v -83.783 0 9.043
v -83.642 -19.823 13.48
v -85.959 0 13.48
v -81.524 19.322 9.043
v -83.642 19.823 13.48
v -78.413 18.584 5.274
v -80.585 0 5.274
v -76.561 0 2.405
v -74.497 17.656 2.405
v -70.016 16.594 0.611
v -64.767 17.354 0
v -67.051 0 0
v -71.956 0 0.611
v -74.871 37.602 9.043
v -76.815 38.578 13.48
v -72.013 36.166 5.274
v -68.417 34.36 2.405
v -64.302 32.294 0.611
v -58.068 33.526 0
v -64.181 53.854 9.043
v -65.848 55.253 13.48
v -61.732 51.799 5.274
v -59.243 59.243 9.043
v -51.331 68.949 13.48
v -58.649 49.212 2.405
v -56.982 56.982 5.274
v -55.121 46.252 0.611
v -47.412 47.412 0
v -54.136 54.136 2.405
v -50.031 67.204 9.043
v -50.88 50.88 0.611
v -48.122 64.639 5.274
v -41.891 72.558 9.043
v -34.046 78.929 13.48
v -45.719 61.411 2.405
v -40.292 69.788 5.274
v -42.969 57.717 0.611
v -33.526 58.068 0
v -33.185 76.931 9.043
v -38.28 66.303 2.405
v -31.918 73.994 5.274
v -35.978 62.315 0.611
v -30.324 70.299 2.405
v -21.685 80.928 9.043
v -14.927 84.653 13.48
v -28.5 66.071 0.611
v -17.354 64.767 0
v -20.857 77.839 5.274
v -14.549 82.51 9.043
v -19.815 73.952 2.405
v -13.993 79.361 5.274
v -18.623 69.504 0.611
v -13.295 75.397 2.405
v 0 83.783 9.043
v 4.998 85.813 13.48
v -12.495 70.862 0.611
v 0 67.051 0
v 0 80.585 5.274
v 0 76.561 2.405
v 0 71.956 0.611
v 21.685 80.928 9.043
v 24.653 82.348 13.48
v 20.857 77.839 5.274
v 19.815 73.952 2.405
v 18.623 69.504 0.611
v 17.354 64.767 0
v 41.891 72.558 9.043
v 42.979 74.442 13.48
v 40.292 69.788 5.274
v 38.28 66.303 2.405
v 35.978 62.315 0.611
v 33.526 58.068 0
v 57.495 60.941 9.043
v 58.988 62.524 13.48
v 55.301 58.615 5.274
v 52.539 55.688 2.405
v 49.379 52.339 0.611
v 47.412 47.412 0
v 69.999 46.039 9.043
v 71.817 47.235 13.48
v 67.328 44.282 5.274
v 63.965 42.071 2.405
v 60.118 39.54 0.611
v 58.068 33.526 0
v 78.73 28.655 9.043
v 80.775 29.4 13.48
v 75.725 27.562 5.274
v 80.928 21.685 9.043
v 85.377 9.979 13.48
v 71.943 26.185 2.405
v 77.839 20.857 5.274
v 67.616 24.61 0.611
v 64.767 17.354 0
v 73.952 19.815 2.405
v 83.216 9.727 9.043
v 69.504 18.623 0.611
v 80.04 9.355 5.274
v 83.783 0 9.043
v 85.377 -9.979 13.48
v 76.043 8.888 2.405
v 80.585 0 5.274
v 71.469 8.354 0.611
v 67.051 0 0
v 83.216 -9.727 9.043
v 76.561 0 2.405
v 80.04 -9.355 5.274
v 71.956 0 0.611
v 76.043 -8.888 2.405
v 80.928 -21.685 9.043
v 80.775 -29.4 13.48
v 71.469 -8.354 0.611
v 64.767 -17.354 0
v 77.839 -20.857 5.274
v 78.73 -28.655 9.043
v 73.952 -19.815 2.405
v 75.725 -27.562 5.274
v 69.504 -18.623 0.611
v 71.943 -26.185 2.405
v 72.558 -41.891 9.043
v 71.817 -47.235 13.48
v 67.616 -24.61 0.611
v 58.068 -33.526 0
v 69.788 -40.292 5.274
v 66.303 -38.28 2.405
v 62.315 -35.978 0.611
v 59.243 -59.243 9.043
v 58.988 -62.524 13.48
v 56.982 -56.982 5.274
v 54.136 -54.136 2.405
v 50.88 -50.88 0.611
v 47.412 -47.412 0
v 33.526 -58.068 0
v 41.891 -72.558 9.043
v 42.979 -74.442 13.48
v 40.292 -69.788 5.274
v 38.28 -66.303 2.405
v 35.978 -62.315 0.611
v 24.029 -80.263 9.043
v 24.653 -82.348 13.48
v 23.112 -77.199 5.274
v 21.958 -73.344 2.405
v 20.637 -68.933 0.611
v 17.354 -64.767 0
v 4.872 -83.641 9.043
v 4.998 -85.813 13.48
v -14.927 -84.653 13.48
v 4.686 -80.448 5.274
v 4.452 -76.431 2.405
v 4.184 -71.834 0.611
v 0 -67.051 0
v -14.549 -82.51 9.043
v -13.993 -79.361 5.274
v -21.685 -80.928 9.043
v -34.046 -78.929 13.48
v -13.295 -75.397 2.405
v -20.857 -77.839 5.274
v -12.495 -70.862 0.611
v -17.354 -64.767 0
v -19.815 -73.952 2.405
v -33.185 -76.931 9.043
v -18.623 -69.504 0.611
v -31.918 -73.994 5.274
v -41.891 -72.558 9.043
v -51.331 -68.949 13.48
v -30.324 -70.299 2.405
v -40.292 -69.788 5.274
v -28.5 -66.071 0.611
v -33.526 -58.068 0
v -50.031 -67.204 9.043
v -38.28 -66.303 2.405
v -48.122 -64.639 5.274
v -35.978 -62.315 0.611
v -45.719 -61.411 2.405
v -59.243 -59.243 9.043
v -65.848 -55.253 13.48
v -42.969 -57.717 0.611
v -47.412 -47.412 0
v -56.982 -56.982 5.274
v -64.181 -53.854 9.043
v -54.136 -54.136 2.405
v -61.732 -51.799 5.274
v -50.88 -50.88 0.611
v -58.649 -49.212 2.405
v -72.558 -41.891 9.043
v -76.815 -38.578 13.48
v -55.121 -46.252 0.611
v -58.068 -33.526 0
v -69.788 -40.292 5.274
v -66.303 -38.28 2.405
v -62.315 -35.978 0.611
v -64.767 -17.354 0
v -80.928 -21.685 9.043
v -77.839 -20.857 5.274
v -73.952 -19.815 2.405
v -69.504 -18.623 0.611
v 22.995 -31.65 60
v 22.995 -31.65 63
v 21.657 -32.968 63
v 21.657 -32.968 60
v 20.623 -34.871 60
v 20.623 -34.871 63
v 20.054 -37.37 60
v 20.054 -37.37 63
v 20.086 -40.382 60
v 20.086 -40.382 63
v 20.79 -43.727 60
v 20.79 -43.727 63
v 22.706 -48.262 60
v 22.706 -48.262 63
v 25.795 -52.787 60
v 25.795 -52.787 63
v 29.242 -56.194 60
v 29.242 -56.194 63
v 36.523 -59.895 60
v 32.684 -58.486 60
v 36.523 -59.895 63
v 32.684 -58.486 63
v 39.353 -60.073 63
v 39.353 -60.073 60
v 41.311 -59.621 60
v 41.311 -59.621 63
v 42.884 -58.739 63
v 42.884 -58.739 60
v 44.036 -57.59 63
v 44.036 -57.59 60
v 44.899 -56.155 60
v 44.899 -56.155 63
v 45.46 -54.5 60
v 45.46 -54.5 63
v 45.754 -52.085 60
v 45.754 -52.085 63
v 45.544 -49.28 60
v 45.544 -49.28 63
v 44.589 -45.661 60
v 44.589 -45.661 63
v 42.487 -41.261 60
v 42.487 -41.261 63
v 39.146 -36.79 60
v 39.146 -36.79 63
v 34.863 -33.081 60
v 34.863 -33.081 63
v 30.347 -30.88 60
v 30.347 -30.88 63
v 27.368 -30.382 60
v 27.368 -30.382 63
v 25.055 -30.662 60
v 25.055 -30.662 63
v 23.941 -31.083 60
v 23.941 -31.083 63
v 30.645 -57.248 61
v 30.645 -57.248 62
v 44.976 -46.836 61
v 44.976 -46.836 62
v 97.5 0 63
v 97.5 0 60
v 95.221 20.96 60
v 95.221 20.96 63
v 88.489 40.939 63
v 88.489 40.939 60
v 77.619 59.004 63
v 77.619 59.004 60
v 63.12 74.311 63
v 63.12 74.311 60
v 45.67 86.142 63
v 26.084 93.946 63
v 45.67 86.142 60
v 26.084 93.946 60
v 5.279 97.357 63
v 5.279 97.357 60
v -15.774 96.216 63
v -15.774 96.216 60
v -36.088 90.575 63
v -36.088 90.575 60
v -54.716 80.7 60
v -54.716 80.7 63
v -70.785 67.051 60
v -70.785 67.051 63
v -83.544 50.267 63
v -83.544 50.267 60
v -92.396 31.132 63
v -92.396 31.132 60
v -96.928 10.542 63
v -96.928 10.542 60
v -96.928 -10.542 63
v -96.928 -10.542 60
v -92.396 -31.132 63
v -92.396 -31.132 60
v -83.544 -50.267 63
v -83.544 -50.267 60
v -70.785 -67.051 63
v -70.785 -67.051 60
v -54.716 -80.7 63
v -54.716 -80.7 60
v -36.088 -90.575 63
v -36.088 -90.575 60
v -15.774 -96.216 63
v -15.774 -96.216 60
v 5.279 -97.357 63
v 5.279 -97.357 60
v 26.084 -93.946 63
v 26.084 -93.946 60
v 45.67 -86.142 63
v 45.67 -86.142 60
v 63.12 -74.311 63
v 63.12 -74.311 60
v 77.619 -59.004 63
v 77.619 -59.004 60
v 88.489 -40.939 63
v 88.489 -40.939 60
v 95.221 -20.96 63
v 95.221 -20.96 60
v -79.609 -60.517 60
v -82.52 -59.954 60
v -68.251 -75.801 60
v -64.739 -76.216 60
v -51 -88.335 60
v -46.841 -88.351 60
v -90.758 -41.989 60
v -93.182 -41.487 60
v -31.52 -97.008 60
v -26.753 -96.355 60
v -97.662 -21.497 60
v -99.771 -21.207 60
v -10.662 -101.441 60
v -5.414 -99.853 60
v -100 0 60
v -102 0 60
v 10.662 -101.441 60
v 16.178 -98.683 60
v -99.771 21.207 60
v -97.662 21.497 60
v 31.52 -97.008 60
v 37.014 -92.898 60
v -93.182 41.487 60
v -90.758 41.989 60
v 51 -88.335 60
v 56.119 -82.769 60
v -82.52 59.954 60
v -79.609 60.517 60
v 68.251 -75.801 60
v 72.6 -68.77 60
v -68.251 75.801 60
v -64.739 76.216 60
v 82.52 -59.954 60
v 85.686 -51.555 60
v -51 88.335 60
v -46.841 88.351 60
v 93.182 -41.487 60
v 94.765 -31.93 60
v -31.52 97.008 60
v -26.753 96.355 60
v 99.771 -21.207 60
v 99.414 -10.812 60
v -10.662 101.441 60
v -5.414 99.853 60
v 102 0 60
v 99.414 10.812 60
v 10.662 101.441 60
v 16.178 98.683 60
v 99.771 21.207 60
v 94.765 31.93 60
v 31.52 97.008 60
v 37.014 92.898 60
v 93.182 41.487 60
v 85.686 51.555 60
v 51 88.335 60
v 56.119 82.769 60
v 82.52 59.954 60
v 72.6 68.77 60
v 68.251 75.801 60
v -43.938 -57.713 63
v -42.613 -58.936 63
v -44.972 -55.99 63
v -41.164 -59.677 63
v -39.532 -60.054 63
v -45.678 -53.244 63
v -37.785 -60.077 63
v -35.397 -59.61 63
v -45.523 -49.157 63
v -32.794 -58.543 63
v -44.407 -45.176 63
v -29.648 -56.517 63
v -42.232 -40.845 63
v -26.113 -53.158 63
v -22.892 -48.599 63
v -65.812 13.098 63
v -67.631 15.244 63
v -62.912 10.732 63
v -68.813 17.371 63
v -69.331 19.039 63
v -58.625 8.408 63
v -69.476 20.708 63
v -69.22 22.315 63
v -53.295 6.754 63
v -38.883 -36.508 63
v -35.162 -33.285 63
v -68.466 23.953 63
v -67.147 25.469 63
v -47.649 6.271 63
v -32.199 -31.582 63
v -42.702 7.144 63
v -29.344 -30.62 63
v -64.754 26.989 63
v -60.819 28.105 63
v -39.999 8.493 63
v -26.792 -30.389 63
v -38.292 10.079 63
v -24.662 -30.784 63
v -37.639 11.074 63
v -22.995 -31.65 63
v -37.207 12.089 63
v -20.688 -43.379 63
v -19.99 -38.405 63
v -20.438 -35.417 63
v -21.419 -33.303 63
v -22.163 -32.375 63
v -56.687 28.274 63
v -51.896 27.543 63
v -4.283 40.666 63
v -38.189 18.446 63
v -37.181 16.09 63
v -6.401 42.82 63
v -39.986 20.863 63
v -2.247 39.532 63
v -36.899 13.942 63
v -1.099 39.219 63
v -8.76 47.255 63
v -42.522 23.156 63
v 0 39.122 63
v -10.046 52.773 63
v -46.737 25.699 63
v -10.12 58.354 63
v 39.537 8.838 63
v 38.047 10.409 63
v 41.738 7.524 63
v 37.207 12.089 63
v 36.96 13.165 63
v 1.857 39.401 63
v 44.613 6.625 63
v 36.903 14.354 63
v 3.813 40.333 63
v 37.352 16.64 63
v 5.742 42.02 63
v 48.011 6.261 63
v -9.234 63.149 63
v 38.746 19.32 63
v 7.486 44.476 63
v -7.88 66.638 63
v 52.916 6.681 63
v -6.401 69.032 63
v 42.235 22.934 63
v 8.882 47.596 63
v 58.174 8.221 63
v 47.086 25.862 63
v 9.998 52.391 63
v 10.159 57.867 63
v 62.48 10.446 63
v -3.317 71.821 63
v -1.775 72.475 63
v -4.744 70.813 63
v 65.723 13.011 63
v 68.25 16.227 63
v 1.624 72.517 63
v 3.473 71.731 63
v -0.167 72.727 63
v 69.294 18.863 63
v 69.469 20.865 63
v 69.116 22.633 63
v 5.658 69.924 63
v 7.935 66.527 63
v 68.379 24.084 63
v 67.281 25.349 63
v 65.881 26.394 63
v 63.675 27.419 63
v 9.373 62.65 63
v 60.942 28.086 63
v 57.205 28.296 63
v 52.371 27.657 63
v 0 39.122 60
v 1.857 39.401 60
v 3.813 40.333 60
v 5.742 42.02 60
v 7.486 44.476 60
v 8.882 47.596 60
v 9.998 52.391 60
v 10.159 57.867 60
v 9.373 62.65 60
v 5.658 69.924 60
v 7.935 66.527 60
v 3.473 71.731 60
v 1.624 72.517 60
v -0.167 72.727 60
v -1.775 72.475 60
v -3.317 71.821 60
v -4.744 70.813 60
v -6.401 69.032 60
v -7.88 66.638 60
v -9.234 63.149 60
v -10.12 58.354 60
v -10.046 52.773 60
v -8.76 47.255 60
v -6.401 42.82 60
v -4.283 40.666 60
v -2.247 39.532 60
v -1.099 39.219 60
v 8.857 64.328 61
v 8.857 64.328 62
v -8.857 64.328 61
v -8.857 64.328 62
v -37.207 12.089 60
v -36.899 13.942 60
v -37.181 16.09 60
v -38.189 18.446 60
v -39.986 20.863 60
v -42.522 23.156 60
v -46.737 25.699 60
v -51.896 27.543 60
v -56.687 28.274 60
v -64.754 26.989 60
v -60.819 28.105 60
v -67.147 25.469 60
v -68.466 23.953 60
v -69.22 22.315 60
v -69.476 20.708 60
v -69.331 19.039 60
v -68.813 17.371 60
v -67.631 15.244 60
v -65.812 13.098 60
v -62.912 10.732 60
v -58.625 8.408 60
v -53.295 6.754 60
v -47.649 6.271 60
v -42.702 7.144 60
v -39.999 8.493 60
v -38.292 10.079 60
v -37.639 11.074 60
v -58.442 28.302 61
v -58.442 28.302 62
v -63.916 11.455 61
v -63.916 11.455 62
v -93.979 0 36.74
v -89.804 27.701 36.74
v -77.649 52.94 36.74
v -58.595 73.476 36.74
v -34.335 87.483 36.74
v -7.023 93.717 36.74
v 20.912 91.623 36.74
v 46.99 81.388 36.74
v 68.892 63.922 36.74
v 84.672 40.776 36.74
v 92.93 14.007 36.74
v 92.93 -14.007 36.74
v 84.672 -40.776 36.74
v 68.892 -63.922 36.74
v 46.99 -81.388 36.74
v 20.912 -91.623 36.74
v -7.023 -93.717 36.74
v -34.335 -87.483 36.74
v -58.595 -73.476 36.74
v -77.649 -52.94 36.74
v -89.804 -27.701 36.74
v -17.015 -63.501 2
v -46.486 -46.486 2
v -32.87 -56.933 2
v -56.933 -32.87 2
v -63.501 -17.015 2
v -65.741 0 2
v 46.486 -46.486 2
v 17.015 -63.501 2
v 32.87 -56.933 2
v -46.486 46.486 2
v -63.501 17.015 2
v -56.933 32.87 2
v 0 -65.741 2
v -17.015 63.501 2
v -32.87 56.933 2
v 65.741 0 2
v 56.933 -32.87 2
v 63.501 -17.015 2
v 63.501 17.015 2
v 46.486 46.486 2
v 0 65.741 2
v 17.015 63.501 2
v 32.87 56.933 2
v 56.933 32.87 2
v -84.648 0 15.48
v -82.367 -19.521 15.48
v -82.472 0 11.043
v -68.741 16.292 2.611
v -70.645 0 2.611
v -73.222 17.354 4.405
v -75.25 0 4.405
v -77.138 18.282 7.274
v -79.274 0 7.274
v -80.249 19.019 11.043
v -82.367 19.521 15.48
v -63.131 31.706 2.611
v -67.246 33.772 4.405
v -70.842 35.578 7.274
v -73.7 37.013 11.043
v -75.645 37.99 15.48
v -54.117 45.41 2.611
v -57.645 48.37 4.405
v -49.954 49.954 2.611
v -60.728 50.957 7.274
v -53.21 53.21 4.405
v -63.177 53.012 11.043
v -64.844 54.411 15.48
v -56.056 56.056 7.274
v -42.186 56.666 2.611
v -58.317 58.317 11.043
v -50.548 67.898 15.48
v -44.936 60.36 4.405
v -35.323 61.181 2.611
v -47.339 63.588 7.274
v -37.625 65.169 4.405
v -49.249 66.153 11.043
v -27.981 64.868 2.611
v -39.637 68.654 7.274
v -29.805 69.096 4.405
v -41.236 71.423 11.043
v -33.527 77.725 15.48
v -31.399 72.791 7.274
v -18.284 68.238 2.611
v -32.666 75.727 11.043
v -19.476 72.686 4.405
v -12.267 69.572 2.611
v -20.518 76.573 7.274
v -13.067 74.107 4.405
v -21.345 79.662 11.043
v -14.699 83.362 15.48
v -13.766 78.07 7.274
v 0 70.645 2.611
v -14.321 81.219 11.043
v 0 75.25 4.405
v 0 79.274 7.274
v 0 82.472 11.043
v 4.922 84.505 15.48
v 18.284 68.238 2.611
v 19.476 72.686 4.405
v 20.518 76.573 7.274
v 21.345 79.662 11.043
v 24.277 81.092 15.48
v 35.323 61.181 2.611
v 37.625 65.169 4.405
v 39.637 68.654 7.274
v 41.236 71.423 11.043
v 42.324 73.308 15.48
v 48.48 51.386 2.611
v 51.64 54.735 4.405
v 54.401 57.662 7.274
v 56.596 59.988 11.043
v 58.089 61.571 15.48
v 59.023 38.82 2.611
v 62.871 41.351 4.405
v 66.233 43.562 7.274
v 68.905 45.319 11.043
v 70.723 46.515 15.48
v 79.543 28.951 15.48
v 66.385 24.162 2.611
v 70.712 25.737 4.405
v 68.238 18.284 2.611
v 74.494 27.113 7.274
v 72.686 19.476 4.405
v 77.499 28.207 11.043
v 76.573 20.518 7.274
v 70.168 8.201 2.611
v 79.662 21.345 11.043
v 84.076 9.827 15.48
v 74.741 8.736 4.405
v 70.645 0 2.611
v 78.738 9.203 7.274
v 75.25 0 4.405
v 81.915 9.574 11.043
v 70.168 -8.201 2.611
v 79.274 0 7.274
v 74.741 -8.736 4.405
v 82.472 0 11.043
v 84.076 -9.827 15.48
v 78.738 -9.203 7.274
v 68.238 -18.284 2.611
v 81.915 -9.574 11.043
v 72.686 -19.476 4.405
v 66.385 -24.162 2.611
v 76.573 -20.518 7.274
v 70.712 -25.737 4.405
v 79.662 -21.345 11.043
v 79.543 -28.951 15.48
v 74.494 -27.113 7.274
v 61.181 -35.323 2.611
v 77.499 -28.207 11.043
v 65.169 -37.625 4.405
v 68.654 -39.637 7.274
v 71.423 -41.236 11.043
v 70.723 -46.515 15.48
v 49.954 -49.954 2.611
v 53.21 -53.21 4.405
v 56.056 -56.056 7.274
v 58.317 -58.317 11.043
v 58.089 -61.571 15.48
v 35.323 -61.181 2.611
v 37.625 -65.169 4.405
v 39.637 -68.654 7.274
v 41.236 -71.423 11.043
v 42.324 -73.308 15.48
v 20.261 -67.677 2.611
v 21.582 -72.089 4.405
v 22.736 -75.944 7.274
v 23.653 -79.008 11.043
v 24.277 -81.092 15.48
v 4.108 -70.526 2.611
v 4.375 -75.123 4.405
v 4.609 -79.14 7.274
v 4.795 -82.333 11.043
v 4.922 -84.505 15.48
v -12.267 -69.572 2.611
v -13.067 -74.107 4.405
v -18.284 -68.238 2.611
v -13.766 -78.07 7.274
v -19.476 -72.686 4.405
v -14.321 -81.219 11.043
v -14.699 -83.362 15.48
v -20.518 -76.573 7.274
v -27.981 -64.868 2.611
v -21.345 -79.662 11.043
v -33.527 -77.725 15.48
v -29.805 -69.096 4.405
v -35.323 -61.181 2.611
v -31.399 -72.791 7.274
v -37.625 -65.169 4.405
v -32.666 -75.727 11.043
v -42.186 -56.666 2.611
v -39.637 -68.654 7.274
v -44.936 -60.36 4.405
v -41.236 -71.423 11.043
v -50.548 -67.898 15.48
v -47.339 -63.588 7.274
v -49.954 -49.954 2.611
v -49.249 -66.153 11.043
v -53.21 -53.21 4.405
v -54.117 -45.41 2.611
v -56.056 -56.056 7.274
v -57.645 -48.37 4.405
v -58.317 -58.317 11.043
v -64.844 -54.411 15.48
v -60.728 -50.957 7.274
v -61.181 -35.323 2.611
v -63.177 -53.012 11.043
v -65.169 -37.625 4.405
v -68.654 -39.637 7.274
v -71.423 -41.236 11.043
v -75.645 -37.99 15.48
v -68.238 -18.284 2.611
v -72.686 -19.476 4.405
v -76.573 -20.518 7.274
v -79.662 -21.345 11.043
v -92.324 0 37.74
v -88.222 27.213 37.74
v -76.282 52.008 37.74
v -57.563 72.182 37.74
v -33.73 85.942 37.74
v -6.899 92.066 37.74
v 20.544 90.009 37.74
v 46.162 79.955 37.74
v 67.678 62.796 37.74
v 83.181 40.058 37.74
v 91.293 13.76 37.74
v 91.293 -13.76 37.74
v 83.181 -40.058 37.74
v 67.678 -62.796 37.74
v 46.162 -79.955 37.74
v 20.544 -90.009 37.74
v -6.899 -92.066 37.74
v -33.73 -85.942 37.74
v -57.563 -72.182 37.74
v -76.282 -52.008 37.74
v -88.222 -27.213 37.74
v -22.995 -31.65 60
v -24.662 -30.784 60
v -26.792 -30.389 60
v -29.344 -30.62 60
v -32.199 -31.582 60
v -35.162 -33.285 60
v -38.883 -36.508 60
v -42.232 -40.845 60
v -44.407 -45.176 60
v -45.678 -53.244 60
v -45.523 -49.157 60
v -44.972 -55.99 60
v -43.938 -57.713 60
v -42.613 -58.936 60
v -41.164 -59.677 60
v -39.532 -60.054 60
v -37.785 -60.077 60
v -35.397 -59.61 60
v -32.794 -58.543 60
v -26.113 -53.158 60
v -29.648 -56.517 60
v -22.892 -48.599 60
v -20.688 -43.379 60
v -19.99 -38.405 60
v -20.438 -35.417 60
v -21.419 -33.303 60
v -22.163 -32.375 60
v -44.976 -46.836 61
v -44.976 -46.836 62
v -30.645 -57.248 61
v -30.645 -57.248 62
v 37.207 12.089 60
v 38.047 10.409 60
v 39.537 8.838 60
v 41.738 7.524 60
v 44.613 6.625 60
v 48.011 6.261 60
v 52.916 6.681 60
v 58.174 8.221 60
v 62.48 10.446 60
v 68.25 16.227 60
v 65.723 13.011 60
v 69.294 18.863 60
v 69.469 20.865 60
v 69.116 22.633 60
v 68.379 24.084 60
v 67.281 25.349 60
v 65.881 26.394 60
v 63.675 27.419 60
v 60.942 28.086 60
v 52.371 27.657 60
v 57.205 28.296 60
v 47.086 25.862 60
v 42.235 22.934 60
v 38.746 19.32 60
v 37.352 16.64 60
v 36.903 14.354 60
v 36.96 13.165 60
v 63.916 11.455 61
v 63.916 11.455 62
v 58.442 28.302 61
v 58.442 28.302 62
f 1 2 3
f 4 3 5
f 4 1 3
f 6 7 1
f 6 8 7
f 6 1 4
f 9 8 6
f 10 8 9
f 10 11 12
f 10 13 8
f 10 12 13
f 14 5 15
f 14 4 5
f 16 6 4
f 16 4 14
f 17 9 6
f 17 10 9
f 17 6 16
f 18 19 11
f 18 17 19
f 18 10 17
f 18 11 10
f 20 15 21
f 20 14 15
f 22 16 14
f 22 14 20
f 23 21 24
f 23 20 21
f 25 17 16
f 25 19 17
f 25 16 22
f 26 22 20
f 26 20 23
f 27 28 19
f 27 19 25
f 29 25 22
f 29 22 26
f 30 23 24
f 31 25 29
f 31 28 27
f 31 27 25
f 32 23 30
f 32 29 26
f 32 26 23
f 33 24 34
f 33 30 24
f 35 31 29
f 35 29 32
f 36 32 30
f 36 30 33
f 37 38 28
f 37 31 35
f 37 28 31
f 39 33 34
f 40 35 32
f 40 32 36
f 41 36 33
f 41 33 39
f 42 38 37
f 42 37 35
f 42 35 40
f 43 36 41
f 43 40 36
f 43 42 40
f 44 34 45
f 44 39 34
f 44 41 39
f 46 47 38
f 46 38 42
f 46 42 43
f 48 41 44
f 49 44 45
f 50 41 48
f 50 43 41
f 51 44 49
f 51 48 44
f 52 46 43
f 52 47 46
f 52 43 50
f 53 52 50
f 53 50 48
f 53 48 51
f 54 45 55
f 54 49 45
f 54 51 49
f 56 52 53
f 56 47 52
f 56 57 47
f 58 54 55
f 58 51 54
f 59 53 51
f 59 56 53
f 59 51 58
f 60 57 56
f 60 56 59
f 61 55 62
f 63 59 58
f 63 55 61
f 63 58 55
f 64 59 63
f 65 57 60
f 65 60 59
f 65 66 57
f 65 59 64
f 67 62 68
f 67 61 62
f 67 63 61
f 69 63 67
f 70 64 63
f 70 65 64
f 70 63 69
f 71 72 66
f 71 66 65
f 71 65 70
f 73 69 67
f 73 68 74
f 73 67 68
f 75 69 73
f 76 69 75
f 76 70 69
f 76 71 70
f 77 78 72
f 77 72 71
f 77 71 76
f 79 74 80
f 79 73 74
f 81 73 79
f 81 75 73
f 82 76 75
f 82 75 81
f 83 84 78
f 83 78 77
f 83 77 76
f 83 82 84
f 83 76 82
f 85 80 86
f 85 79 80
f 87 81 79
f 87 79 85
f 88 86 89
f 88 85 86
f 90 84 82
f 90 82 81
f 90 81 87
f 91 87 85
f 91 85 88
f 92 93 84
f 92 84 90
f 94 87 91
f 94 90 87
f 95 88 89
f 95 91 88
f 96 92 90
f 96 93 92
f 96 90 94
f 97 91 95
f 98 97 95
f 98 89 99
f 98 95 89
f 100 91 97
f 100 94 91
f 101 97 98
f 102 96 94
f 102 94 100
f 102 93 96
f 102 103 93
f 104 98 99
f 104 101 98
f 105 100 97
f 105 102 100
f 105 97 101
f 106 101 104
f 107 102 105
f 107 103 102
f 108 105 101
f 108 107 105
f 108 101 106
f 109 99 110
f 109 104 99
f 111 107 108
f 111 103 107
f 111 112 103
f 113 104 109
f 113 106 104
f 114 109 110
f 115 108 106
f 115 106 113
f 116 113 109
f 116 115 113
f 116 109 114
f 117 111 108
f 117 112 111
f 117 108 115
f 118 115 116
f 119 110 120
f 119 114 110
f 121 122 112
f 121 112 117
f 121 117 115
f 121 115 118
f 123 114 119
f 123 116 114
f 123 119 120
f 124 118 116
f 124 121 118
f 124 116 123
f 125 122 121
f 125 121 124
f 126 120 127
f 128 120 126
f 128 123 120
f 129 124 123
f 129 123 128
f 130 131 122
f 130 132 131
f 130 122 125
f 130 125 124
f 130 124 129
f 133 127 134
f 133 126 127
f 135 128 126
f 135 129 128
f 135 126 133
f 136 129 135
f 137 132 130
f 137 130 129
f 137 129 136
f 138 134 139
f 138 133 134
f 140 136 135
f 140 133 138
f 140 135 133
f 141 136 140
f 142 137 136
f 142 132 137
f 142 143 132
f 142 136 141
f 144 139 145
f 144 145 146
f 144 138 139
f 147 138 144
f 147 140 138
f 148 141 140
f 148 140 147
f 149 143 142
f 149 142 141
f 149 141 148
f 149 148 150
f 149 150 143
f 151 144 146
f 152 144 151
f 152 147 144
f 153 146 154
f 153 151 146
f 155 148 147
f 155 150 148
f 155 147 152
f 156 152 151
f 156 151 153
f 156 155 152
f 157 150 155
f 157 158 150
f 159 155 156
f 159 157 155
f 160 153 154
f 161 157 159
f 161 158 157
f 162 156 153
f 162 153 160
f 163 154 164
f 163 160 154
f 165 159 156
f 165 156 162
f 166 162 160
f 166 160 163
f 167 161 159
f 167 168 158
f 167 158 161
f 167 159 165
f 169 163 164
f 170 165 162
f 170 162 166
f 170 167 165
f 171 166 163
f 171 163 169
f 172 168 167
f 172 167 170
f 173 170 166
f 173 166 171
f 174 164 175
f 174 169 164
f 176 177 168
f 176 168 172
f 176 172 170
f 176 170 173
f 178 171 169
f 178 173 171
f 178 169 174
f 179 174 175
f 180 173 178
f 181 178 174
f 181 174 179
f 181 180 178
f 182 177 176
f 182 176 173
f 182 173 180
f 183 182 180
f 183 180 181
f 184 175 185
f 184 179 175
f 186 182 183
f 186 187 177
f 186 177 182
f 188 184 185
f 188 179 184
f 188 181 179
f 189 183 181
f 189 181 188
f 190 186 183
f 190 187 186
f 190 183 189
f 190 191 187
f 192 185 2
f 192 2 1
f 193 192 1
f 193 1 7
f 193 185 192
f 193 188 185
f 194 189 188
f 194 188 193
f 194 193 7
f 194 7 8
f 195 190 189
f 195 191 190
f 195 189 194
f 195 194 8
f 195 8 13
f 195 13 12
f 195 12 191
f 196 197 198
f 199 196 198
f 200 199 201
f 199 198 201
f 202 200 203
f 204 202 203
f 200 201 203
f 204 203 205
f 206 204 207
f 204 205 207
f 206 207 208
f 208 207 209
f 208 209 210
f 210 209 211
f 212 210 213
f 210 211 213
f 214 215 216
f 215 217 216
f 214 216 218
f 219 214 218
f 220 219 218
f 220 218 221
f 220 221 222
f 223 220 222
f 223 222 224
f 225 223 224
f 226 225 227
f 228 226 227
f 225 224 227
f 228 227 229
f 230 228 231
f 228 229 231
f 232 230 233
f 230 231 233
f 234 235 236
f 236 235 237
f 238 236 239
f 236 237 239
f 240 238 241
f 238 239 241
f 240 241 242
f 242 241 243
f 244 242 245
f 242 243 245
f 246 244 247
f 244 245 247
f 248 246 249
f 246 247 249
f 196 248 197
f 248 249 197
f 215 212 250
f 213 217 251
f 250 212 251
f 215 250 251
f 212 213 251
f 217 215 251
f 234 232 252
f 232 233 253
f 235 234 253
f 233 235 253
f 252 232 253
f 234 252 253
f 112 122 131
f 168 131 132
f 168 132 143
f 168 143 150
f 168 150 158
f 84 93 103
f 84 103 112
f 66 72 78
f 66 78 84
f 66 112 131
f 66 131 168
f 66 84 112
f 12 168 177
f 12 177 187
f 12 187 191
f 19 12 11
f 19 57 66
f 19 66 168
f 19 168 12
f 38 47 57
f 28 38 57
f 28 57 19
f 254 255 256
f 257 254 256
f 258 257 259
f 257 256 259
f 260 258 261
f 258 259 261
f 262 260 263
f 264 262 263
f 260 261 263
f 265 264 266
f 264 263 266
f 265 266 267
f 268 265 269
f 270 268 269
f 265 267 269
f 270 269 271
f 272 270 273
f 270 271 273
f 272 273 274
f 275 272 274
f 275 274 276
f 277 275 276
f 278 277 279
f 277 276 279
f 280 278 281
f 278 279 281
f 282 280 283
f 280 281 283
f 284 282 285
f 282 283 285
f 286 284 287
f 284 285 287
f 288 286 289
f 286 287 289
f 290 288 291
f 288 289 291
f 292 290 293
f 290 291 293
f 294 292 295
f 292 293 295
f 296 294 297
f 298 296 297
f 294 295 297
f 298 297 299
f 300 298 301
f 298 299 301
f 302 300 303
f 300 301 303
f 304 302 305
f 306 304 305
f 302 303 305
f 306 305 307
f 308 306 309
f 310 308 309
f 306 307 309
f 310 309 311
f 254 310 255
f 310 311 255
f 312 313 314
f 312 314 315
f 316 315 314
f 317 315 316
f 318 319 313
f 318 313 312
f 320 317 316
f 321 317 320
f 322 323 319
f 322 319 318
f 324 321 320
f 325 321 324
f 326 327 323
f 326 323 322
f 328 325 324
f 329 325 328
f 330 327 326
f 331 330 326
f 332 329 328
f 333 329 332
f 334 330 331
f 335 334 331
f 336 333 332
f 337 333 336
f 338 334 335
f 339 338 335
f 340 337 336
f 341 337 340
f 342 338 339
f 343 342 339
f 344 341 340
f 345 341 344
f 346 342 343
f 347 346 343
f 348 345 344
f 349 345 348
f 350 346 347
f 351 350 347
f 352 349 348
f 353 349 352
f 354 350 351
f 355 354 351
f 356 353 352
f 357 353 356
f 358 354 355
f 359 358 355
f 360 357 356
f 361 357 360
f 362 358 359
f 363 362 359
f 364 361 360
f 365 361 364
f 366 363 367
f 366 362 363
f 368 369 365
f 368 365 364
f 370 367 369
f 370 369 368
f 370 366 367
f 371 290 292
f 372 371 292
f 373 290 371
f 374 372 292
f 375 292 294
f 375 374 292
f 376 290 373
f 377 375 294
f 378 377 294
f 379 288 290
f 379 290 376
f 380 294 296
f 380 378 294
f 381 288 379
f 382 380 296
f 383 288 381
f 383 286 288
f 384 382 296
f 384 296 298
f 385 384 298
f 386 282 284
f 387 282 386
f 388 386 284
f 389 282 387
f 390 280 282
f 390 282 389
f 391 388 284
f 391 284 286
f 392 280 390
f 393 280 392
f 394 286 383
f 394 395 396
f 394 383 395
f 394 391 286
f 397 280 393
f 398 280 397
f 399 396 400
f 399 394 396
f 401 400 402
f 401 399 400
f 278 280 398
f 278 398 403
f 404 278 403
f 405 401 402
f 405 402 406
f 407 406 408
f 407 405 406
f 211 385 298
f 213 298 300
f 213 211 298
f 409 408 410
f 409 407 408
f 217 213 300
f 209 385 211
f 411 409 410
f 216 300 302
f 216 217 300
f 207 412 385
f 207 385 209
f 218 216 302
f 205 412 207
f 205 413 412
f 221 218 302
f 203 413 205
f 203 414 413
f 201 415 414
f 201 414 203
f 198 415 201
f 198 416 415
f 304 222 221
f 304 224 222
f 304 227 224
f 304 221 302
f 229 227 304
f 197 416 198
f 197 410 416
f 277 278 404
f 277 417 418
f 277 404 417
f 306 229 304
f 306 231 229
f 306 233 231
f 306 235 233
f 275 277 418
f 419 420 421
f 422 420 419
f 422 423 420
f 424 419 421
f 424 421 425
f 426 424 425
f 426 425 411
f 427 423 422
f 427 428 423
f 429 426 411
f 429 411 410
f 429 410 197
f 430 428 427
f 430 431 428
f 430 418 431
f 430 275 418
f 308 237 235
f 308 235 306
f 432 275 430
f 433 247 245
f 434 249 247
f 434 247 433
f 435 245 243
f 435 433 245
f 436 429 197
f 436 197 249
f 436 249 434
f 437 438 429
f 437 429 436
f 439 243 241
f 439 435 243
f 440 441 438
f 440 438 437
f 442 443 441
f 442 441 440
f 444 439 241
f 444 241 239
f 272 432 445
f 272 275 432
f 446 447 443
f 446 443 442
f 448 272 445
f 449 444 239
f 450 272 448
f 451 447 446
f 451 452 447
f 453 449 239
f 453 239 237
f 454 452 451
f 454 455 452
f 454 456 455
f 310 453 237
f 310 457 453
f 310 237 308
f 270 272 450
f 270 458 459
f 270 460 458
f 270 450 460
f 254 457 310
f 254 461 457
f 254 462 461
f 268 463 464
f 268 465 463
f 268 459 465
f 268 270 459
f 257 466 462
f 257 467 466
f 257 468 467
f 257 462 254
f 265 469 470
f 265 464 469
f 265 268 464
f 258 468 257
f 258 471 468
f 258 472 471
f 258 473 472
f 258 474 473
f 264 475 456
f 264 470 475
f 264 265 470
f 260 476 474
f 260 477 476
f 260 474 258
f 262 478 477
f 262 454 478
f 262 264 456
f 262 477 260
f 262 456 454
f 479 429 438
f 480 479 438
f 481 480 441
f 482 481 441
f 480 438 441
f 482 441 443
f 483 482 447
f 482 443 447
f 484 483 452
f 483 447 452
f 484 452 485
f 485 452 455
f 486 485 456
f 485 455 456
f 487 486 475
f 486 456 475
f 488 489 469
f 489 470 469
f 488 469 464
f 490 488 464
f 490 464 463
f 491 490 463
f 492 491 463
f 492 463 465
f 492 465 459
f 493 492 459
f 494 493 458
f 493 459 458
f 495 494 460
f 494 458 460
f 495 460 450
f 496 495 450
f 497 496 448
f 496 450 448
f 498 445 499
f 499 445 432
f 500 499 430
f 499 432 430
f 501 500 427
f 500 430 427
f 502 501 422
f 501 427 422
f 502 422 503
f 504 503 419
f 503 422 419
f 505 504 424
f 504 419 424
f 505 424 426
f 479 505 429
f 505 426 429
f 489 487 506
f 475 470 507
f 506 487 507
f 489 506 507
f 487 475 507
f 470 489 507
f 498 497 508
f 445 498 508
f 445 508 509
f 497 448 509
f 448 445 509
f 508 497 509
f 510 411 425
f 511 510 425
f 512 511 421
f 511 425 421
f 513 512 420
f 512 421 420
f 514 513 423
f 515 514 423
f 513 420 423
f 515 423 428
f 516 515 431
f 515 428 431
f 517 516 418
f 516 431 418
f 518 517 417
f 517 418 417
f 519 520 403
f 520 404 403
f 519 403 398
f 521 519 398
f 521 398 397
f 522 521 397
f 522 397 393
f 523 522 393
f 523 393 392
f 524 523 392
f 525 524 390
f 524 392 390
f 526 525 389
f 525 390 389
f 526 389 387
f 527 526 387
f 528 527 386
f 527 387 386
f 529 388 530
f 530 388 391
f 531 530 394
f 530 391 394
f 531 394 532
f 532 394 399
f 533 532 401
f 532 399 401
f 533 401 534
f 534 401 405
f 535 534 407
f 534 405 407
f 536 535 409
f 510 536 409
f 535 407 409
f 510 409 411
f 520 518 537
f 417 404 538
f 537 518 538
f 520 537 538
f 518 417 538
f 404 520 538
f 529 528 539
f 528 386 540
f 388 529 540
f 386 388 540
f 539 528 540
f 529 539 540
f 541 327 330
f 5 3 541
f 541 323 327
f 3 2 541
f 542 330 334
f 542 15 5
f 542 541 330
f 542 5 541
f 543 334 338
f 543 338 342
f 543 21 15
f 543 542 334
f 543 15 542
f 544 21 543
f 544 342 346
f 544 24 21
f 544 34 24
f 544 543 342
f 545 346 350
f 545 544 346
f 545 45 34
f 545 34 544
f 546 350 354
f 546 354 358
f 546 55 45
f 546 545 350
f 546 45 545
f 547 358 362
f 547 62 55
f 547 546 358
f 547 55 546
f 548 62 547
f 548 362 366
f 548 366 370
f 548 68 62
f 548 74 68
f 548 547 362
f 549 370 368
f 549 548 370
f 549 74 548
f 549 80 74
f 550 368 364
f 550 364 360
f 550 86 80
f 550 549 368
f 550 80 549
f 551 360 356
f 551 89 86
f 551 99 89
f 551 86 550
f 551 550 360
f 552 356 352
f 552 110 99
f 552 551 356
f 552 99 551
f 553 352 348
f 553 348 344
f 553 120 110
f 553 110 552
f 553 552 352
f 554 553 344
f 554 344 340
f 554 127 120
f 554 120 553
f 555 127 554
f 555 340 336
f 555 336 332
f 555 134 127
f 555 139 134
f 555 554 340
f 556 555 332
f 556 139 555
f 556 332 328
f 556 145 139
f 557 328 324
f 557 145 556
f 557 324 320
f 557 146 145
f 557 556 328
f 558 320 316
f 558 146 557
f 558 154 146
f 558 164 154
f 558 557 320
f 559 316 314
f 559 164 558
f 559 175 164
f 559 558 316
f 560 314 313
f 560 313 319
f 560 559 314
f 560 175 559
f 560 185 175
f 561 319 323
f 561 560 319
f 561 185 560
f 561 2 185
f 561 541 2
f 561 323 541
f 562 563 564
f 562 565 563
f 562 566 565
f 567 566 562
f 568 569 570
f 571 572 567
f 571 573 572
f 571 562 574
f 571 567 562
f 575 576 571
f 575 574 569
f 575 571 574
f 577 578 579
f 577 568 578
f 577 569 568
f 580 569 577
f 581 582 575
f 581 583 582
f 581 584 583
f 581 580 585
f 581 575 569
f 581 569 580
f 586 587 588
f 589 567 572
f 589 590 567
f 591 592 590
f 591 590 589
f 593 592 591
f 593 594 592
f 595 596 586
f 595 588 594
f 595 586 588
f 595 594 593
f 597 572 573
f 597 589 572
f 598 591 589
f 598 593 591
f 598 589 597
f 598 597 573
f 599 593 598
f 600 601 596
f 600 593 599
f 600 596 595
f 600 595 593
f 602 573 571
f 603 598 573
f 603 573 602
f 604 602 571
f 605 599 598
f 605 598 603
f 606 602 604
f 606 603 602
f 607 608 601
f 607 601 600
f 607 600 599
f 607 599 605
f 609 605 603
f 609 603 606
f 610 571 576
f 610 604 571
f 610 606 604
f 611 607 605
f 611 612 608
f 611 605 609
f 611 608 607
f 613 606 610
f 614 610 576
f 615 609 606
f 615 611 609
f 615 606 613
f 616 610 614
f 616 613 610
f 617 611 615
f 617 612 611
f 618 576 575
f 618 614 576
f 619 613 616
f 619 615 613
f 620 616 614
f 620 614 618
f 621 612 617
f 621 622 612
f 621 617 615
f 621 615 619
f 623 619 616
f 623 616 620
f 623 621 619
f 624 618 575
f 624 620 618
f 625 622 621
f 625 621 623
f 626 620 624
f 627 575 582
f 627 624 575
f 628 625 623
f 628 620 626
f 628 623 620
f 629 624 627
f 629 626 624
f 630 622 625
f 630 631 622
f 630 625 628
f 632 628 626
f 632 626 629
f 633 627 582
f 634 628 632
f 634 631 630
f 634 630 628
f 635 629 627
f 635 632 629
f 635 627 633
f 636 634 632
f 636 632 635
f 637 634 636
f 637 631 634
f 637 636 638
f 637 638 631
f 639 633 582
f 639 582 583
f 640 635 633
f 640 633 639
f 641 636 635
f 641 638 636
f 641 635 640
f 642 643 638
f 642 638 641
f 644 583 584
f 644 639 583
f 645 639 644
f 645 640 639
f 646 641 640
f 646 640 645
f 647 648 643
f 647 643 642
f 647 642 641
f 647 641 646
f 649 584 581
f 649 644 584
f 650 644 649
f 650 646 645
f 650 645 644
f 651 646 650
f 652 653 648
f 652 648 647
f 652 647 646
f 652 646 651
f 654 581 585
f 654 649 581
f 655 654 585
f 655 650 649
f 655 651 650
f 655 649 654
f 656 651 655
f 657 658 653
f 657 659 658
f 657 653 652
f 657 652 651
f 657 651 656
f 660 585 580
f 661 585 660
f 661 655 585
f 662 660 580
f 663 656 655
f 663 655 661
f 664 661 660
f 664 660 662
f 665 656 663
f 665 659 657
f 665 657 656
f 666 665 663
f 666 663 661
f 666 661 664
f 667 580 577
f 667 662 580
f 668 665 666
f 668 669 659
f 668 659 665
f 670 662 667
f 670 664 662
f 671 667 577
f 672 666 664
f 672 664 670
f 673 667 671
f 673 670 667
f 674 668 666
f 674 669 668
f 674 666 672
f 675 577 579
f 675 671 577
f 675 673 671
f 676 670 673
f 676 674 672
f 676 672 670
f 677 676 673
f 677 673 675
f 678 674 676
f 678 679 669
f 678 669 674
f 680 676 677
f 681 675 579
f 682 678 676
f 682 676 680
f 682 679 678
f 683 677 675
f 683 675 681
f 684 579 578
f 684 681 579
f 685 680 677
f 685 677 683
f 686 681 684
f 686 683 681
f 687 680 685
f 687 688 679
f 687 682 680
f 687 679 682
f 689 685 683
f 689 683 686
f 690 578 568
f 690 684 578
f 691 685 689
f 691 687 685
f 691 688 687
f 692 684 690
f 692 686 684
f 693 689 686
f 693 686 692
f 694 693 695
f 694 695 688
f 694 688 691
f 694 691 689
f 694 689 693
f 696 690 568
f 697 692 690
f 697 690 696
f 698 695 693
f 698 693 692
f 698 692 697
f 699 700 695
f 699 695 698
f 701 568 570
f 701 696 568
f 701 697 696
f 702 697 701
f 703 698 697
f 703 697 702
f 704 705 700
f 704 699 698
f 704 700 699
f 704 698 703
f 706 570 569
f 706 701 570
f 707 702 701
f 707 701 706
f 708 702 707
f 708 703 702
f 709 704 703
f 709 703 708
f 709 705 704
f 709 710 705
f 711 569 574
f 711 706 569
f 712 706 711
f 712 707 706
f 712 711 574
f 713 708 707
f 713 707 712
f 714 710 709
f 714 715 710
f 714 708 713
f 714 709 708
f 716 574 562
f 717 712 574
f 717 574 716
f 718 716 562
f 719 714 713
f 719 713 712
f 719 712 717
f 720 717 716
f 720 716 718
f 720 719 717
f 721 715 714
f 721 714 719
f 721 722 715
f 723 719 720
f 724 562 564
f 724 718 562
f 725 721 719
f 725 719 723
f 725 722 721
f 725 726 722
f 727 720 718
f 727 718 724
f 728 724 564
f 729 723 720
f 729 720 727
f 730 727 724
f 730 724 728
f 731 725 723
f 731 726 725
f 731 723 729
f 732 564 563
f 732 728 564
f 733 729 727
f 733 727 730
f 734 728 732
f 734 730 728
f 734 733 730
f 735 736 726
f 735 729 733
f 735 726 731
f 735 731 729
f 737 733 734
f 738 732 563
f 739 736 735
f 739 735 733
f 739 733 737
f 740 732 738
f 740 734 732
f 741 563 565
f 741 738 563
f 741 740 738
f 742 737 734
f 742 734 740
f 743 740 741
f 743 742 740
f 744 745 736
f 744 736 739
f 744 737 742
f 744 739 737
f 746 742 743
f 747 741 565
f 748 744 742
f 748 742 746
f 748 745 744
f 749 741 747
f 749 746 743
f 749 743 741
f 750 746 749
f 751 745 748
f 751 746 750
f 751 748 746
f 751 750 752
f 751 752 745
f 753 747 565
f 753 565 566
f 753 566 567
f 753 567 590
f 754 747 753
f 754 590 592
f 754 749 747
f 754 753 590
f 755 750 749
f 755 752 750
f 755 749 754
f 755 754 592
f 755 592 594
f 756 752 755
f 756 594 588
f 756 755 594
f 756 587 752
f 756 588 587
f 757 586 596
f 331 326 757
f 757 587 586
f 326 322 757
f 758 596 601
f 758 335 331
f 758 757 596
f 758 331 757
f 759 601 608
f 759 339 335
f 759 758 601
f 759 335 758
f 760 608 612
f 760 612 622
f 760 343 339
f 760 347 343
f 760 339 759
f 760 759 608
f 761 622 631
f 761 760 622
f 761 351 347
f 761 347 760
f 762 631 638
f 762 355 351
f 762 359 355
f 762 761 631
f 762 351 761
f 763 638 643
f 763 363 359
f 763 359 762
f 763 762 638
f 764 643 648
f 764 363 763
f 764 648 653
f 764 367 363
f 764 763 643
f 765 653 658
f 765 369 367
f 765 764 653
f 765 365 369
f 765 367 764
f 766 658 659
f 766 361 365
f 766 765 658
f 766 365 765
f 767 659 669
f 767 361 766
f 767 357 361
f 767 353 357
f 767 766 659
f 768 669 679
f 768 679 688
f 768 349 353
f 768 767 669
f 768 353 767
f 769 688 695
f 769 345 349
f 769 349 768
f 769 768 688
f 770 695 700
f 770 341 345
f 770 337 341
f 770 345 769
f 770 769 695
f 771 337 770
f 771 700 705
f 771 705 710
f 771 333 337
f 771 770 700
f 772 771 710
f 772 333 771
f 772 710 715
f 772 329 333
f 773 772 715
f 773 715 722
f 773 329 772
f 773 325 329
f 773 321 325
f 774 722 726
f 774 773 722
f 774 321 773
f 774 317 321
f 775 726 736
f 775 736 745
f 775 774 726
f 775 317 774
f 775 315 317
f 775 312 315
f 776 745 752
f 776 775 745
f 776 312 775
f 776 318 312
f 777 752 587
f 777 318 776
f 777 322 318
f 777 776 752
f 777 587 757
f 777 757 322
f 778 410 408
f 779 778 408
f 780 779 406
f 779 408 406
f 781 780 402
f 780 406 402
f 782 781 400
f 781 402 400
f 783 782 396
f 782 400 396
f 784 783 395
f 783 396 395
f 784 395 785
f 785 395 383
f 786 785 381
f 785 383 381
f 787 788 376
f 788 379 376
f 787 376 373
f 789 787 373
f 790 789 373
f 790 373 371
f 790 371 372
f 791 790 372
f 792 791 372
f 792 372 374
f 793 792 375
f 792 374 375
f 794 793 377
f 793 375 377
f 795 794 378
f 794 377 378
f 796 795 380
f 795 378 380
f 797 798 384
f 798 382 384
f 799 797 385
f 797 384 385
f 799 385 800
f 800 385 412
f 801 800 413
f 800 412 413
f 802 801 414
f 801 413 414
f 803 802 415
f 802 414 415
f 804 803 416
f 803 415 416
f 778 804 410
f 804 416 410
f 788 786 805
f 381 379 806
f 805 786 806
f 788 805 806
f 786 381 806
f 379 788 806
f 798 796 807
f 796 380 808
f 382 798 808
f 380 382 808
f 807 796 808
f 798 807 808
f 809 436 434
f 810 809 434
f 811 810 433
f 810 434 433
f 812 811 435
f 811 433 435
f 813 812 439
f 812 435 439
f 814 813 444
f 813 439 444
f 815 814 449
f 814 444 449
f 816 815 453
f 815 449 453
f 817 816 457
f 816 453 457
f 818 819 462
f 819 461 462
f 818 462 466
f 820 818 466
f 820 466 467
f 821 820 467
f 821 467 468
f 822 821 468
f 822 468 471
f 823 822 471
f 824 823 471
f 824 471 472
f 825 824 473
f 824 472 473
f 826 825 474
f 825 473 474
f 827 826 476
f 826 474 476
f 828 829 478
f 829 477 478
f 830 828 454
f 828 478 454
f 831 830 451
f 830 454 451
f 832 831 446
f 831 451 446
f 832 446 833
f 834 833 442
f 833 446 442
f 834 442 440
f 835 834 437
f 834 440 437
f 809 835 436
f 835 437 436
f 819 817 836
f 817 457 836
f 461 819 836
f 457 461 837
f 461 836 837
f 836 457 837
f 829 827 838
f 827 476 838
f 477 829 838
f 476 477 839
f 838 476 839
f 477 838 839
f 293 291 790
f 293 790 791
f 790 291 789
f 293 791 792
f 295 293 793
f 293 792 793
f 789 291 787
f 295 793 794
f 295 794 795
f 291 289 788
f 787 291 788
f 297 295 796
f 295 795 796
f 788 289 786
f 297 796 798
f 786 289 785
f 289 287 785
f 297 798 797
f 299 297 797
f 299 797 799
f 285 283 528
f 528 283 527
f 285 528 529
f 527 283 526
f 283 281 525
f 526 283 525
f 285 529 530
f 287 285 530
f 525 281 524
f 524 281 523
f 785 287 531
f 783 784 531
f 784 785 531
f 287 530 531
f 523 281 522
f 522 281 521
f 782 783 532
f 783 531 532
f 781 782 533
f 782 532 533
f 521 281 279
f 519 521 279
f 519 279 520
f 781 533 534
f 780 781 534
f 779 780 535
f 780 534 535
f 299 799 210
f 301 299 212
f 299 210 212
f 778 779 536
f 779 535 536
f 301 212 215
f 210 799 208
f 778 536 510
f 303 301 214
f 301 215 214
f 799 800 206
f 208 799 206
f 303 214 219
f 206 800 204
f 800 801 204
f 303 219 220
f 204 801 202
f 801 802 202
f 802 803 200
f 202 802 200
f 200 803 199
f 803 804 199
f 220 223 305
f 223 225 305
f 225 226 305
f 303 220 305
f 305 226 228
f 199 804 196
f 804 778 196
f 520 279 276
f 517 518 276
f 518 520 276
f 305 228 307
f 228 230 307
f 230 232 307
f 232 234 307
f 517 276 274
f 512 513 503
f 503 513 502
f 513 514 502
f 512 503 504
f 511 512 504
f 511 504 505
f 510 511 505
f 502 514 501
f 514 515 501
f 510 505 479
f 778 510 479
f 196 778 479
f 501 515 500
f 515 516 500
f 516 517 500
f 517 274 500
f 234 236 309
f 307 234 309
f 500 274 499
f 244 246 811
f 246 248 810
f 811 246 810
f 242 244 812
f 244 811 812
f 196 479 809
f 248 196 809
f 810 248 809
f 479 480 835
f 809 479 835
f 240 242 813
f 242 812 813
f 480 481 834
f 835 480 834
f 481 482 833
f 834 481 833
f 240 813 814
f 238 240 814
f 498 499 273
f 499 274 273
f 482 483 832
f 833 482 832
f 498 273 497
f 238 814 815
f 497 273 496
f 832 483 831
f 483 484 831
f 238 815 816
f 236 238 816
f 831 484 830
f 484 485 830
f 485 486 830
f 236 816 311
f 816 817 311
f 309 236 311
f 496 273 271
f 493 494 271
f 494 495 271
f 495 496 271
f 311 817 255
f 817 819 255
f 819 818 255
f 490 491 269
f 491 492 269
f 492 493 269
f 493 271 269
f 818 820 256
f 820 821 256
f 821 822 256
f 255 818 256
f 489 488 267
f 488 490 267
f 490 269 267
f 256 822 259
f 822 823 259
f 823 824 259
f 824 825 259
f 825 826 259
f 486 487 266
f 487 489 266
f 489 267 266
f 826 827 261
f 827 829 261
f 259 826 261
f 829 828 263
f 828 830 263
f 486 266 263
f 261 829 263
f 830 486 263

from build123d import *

# Parameters (mm, degrees)
F2_R     = 97.5
F3_DEPTH = 3
F6_DEPTH = 3


with BuildPart() as f1:
    # F0 (on Front) → F1 (revolve)
    with BuildSketch(Plane.XZ):
        with BuildLine():
            Line((-100, 60), (-102, 60))
            Line((-102, 60), (-85.958685, 13.480186))
            ThreePointArc((-85.958685, 13.480186), (-78.661646, 3.715095), (-67.051225, 0))
            Line((-67.051225, 0), (0, 0))
            Line((0, 0), (0, 2))
            Line((0, 2), (-65.74088, 2))
            ThreePointArc((-65.74088, 2), (-77.351301, 5.715095), (-84.64834, 15.480186))
            Line((-84.64834, 15.480186), (-100, 60))
        make_face()
    revolve(axis=Axis((0, 0, 1.660261), (0, 0, -1)))


with BuildPart() as f3:
    # F2 (on face) → F3 (new body)
    with BuildSketch(Plane.XY.offset(60)):
        Circle(F2_R)
    extrude(amount=F3_DEPTH)

    # F5 (on face) → F6 (cut, through all)
    with BuildSketch(Plane.XY.offset(63)):
        with BuildLine():
            add(Edge.make_bspline(
                [(0, 39.121769), (17.713864, 39.121769), (8.856932, 64.327745), (0, 89.53372), (-8.856932, 64.327745), (-17.713864, 39.121769), (0, 39.121769)],
                knots=[0, 0, 0, 2.094395, 2.094395, 4.18879, 4.18879, 6.283185, 6.283185, 6.283185], degree=2, weights=[1, 0.5, 1, 0.5, 1, 0.5, 1]))
        make_face()
        with BuildLine():
            add(Edge.make_bspline(
                [(-37.207014, 12.089292), (-31.733129, 28.936177), (-58.442378, 28.301809), (-85.151628, 27.667441), (-63.916263, 11.454924), (-42.680899, -4.757594), (-37.207014, 12.089292)],
                knots=[0, 0, 0, 2.094395, 2.094395, 4.18879, 4.18879, 6.283185, 6.283185, 6.283185], degree=2, weights=[1, 0.5, 1, 0.5, 1, 0.5, 1]))
        make_face()
        with BuildLine():
            add(Edge.make_bspline(
                [(-22.995199, -31.650176), (-37.326016, -21.238228), (-44.976308, -46.836265), (-52.6266, -72.434301), (-30.645491, -57.248213), (-8.664382, -42.062124), (-22.995199, -31.650176)],
                knots=[0, 0, 0, 2.094395, 2.094395, 4.18879, 4.18879, 6.283185, 6.283185, 6.283185], degree=2, weights=[1, 0.5, 1, 0.5, 1, 0.5, 1]))
        make_face()
        with BuildLine():
            add(Edge.make_bspline(
                [(22.995199, -31.650176), (8.664382, -42.062124), (30.645491, -57.248213), (52.6266, -72.434301), (44.976308, -46.836265), (37.326016, -21.238228), (22.995199, -31.650176)],
                knots=[0, 0, 0, 2.094395, 2.094395, 4.18879, 4.18879, 6.283185, 6.283185, 6.283185], degree=2, weights=[1, 0.5, 1, 0.5, 1, 0.5, 1]))
        make_face()
        with BuildLine():
            add(Edge.make_bspline(
                [(37.207014, 12.089292), (42.680899, -4.757594), (63.916263, 11.454924), (85.151628, 27.667441), (58.442378, 28.301809), (31.733129, 28.936177), (37.207014, 12.089292)],
                knots=[0, 0, 0, 2.094395, 2.094395, 4.18879, 4.18879, 6.283185, 6.283185, 6.283185], degree=2, weights=[1, 0.5, 1, 0.5, 1, 0.5, 1]))
        make_face()
    extrude(amount=-F6_DEPTH, mode=Mode.SUBTRACT)


solid = Compound([f1.part, f3.part])
